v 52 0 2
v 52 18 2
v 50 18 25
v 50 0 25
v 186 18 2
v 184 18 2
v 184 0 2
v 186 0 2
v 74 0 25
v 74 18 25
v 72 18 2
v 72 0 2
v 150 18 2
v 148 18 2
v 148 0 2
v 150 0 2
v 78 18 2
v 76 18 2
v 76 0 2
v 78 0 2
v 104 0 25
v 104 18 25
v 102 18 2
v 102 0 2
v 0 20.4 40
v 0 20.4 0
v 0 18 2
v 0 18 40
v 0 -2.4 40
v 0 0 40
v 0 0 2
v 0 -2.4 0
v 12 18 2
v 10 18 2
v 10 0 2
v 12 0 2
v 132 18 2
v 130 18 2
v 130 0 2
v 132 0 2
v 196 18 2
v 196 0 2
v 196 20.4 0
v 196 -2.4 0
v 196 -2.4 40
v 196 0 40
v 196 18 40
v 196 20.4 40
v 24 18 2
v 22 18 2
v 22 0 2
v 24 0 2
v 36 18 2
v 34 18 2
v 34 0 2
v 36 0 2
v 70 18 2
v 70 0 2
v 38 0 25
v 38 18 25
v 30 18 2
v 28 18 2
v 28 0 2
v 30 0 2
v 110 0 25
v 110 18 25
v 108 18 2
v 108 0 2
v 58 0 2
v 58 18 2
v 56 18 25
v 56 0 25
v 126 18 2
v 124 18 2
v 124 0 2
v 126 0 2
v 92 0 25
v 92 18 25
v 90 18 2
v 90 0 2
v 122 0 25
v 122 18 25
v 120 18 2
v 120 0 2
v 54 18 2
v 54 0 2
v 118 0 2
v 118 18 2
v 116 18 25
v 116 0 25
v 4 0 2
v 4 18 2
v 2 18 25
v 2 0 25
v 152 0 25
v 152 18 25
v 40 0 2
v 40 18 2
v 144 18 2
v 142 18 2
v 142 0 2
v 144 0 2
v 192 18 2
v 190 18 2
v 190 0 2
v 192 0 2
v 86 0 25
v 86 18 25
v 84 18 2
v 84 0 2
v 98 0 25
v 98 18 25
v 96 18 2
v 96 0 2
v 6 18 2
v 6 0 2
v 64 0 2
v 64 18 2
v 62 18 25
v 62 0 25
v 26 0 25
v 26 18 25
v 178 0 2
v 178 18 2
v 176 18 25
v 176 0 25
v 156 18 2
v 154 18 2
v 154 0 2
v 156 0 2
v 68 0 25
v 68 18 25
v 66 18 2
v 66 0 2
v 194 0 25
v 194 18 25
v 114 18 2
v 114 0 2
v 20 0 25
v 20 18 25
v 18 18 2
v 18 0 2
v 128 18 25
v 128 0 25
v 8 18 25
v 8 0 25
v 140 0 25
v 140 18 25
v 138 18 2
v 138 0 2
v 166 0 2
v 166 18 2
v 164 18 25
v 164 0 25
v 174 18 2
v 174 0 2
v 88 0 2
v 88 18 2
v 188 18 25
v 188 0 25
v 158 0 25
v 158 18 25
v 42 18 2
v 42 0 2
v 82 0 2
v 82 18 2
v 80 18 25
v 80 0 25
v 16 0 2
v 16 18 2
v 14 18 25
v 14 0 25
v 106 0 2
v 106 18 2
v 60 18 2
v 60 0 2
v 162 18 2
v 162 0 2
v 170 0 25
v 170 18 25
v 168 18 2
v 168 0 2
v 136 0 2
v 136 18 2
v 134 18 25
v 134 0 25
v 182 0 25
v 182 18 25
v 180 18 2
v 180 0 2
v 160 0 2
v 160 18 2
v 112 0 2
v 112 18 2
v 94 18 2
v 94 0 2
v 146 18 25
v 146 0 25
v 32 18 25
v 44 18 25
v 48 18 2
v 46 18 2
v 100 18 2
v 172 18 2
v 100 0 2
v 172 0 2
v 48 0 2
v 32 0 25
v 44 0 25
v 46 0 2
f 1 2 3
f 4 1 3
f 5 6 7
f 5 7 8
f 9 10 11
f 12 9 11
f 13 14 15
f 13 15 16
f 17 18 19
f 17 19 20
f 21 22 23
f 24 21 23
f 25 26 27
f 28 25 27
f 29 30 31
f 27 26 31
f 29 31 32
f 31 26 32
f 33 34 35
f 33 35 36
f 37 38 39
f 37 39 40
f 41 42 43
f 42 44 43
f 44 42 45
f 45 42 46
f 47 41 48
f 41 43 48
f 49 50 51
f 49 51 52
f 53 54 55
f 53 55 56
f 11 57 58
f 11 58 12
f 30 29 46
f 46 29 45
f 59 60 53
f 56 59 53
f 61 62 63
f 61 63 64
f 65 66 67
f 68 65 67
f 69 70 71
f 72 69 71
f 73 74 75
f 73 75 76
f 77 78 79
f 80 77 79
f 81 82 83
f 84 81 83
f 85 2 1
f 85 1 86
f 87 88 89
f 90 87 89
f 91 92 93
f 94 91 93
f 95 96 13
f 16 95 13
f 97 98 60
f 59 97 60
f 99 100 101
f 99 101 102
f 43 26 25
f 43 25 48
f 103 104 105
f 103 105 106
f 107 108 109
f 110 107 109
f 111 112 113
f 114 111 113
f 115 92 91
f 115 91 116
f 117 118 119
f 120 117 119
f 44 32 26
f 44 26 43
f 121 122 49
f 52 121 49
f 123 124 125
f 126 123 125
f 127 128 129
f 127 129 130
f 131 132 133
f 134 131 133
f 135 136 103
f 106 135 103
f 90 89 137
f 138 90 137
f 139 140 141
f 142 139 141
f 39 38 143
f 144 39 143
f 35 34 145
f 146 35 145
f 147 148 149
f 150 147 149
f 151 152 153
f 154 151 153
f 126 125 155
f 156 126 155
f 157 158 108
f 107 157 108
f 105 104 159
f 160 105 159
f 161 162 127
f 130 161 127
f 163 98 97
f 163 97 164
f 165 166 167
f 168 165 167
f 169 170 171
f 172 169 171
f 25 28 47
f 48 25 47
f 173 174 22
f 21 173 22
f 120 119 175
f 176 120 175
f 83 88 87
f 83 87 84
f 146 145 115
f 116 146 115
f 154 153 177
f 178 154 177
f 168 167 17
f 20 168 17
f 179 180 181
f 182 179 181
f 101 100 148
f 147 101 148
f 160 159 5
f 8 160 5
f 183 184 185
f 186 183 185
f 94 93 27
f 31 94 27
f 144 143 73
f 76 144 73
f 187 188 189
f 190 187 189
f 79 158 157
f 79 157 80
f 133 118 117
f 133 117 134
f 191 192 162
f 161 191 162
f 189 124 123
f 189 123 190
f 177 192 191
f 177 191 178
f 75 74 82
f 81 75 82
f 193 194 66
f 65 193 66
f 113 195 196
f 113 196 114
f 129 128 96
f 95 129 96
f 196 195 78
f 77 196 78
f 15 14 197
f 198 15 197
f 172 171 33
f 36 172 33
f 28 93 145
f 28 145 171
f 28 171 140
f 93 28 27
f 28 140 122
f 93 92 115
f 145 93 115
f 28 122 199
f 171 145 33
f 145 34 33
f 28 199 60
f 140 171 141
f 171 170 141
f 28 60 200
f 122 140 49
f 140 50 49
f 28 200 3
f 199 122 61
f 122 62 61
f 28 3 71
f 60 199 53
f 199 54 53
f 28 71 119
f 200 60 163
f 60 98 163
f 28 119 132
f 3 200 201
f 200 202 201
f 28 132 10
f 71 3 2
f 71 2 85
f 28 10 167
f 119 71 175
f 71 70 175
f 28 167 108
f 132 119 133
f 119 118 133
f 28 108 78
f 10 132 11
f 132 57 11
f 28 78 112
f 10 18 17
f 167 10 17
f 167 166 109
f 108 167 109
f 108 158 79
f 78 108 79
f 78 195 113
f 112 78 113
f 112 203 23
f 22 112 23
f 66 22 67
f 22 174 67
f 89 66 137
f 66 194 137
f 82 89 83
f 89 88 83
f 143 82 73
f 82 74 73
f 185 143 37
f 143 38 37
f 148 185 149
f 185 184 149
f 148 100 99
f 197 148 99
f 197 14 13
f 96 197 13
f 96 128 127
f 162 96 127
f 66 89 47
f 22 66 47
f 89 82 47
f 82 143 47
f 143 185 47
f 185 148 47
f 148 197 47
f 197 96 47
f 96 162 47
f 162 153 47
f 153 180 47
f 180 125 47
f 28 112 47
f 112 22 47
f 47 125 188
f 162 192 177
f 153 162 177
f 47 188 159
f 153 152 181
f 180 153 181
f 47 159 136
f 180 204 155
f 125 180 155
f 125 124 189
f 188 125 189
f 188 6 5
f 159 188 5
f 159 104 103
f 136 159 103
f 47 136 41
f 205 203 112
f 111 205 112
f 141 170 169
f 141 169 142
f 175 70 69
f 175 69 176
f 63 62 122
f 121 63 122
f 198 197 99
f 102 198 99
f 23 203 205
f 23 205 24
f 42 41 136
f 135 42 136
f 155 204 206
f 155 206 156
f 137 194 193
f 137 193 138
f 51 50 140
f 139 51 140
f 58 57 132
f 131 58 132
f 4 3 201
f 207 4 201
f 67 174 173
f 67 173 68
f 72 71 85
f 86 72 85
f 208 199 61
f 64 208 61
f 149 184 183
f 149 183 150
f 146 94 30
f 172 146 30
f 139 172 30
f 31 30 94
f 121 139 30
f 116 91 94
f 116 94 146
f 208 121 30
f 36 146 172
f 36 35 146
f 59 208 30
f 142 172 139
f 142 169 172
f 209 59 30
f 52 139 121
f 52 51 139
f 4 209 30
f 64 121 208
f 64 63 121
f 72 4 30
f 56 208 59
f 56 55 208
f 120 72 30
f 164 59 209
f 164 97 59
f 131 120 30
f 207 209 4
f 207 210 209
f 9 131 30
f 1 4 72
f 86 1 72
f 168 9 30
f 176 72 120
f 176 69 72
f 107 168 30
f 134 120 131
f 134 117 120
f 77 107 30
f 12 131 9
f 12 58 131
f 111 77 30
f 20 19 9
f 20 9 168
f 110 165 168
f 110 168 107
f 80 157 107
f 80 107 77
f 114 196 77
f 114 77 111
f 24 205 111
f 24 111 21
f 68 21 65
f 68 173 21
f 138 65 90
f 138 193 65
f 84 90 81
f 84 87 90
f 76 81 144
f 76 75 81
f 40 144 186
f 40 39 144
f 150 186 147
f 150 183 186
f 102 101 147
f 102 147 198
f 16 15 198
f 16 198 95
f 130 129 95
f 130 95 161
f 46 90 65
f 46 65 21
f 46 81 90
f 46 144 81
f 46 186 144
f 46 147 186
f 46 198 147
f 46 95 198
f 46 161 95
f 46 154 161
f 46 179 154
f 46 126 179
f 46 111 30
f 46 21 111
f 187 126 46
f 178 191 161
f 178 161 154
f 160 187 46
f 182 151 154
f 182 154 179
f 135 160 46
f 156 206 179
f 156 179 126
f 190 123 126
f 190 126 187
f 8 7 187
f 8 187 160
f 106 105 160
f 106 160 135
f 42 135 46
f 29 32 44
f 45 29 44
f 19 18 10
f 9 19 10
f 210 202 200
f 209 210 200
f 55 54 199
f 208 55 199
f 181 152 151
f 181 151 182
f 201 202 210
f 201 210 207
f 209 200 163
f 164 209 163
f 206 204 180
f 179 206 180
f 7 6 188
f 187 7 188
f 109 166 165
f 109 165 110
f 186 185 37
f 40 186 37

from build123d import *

# Parameters (mm, degrees)
F0_W     = 200
F0_H     = 18
F1_DEPTH = 2
F2_W     = 200
F2_H     = 2.4
F3_DEPTH = 40
F5_DEPTH = 18
F6_W     = 4
F6_H     = 40
F7_DEPTH = 22.801


with BuildPart() as f1:
    # F0 (on Top) → F1 (new body)
    with BuildSketch(Plane.XY):
        with Locations((100, 9)):
            Rectangle(F0_W, F0_H)
    extrude(amount=F1_DEPTH)

    # F2 (on face) → F3 (join)
    with BuildSketch(Plane(origin=(0, 0, 0), x_dir=(1, 0, 0), z_dir=(0, 0, -1))):
        with Locations((100, 1.2)):
            Rectangle(F2_W, F2_H)
        with Locations((100, -19.2)):
            Rectangle(F2_W, F2_H)
    extrude(amount=-F3_DEPTH)

    # F4 (on face) → F5 (join, through all)
    with BuildSketch(Plane.XZ.offset(-18)):
        Polygon((2, 25), (0, 2), (4, 2), align=None)
        Polygon((10, 2), (8, 25), (6, 2), align=None)
        Polygon((16, 2), (14, 25), (12, 2), align=None)
        Polygon((22, 2), (20, 25), (18, 2), align=None)
        Polygon((28, 2), (26, 25), (24, 2), align=None)
        Polygon((34, 2), (32, 25), (30, 2), align=None)
        Polygon((40, 2), (38, 25), (36, 2), align=None)
        Polygon((46, 2), (44, 25), (42, 2), align=None)
        Polygon((52, 2), (50, 25), (48, 2), align=None)
        Polygon((58, 2), (56, 25), (54, 2), align=None)
        Polygon((64, 2), (62, 25), (60, 2), align=None)
        Polygon((70, 2), (68, 25), (66, 2), align=None)
        Polygon((76, 2), (74, 25), (72, 2), align=None)
        Polygon((82, 2), (80, 25), (78, 2), align=None)
        Polygon((88, 2), (86, 25), (84, 2), align=None)
        Polygon((94, 2), (92, 25), (90, 2), align=None)
        Polygon((100, 2), (98, 25), (96, 2), align=None)
        Polygon((106, 2), (104, 25), (102, 2), align=None)
        Polygon((112, 2), (110, 25), (108, 2), align=None)
        Polygon((118, 2), (116, 25), (114, 2), align=None)
        Polygon((124, 2), (122, 25), (120, 2), align=None)
        Polygon((130, 2), (128, 25), (126, 2), align=None)
        Polygon((136, 2), (134, 25), (132, 2), align=None)
        Polygon((142, 2), (140, 25), (138, 2), align=None)
        Polygon((148, 2), (146, 25), (144, 2), align=None)
        Polygon((154, 2), (152, 25), (150, 2), align=None)
        Polygon((160, 2), (158, 25), (156, 2), align=None)
        Polygon((166, 2), (164, 25), (162, 2), align=None)
        Polygon((172, 2), (170, 25), (168, 2), align=None)
        Polygon((178, 2), (176, 25), (174, 2), align=None)
        Polygon((184, 2), (182, 25), (180, 2), align=None)
        Polygon((190, 2), (188, 25), (186, 2), align=None)
        Polygon((196, 2), (194, 25), (192, 2), align=None)
    extrude(amount=F5_DEPTH)

    # F6 (on face) → F7 (cut, through all)
    with BuildSketch(Plane(origin=(0, 20.4, 0), x_dir=(-1, 0, 0), z_dir=(0, 1, 0))):
        with Locations((-198, 20)):
            Rectangle(F6_W, F6_H)
    extrude(amount=-F7_DEPTH, mode=Mode.SUBTRACT)


solid = f1.part
